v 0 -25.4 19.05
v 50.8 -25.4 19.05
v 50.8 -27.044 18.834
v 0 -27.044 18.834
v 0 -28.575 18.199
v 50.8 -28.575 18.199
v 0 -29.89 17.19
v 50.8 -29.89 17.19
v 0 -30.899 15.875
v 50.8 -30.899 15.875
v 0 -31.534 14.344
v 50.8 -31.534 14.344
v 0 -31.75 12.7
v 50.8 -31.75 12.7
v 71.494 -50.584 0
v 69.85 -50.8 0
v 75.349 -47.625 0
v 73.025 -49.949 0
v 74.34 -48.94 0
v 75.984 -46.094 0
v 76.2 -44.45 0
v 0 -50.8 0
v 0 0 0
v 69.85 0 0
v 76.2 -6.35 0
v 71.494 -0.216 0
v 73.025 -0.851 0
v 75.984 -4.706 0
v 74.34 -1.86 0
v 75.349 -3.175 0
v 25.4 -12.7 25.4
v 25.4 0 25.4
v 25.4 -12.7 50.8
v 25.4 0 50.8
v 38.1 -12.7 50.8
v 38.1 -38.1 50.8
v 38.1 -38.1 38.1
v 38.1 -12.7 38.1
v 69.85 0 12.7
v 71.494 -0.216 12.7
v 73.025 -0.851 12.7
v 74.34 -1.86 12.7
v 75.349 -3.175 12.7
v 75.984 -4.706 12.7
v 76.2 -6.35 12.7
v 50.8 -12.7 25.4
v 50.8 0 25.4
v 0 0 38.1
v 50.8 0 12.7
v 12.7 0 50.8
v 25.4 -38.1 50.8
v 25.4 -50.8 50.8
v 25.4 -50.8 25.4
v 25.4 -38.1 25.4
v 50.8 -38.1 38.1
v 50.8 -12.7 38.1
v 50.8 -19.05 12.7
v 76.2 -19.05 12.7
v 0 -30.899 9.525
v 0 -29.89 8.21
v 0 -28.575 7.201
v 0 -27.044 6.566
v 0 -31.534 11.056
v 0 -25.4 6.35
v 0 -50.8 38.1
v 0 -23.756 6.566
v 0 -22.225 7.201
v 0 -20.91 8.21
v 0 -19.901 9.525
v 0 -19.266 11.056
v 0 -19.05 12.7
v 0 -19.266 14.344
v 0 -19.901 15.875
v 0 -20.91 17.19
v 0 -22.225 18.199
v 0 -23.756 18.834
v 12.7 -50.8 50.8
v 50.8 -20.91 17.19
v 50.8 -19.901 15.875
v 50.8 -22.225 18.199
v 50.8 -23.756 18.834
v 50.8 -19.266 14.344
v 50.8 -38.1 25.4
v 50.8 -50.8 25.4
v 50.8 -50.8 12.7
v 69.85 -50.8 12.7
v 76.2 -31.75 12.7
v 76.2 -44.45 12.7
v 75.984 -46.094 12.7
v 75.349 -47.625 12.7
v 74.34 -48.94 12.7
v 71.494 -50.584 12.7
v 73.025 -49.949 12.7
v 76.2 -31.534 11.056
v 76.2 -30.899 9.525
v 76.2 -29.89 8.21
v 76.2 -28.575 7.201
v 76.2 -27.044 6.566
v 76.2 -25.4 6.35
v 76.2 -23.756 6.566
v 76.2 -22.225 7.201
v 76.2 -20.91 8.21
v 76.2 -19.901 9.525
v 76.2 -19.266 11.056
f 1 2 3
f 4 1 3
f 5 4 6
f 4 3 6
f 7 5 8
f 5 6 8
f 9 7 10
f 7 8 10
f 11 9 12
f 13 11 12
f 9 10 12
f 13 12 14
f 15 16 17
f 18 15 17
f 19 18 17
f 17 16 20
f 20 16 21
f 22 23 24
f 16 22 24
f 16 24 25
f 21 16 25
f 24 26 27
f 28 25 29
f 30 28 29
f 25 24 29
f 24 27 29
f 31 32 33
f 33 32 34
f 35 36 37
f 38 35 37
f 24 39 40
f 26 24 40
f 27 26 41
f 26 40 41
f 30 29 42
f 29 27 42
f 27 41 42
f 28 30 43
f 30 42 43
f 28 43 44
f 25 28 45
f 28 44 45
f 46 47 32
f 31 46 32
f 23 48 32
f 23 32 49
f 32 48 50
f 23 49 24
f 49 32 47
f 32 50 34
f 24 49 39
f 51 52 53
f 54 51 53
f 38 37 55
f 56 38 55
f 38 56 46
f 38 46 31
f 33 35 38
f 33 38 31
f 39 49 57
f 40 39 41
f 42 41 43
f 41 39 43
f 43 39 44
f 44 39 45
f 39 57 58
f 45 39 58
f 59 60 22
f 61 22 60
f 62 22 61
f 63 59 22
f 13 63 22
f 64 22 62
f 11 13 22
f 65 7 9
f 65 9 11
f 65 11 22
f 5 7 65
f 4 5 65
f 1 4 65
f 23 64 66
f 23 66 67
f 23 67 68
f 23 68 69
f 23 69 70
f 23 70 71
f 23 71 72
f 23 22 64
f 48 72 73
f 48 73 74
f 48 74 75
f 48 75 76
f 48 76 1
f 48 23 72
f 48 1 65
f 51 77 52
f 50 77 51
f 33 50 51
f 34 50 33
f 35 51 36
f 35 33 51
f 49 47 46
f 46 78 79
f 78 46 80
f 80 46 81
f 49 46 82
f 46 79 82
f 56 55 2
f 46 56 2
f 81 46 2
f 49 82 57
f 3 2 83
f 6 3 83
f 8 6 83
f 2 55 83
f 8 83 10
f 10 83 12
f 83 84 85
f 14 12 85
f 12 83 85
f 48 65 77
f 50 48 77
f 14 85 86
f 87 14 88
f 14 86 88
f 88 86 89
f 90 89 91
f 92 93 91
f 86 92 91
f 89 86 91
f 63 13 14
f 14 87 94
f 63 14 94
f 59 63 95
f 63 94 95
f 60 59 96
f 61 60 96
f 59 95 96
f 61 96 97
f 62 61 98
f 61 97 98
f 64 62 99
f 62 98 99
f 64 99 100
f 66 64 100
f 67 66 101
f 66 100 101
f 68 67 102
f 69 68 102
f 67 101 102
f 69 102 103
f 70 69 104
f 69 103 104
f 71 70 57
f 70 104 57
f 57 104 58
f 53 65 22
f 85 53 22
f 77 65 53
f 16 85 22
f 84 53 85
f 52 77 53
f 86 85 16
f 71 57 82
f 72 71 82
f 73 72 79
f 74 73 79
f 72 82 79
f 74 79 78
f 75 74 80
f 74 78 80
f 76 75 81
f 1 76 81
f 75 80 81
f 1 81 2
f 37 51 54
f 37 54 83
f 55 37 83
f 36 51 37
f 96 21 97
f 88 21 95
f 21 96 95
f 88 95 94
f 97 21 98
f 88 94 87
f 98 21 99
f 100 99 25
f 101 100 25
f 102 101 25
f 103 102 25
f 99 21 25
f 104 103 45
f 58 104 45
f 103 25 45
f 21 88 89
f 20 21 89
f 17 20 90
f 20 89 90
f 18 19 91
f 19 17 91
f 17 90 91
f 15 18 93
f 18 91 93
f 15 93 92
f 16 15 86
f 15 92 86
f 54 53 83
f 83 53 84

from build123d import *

# Parameters (mm, degrees)
F0_W      = 76.2
F0_H      = 50.8
F1_DEPTH  = 50.8
F3_DEPTH  = 50.801
F5_DEPTH  = 12.7
F6_W      = 25.4
F6_H      = 25.4
F7_DEPTH  = 12.7
F9_DEPTH  = 12.701
F11_DEPTH = 76.201


with BuildPart() as f1:
    # F0 (on Front) → F1 (new body)
    with BuildSketch(Plane.XZ):
        with Locations((38.1, 25.4)):
            Rectangle(F0_W, F0_H)
    extrude(amount=F1_DEPTH)

    # F2 (on face) → F3 (cut, through all)
    with BuildSketch(Plane.XZ.offset(50.8)):
        Polygon((12.7, 50.8), (0, 50.8), (0, 38.1), align=None)
        Polygon((76.2, 12.7), (76.2, 50.8), (38.1, 50.8), (38.1, 38.1), (50.8, 38.1), (50.8, 12.7), align=None)
    extrude(amount=-F3_DEPTH, mode=Mode.SUBTRACT)

    # F4 (on face) → F5 (cut)
    with BuildSketch(Plane.XZ.offset(50.8)):
        Polygon((25.4, 50.8), (25.4, 25.4), (50.8, 25.4), (50.8, 38.1), (38.1, 38.1), (38.1, 50.8), align=None)
    extrude(amount=-F5_DEPTH, mode=Mode.SUBTRACT)

    # F6 (on face) → F7 (cut)
    with BuildSketch(Plane(origin=(0, 0, 0), x_dir=(-1, 0, 0), z_dir=(0, 1, 0))):
        with Locations((-38.1, 38.1)):
            Rectangle(F6_W, F6_H)
    extrude(amount=-F7_DEPTH, mode=Mode.SUBTRACT)

    # F8 (on face) → F9 (cut, through all)
    with BuildSketch(Plane.XY.offset(12.7)):
        with BuildLine():
            ThreePointArc((76.2, -44.45), (74.340128, -48.940128), (69.85, -50.8))
            Line((69.85, -50.8), (76.2, -50.8))
            Line((76.2, -50.8), (76.2, -44.45))
        make_face()
        with BuildLine():
            Line((76.2, 0), (69.85, 0))
            ThreePointArc((69.85, 0), (74.340128, -1.859872), (76.2, -6.35))
            Line((76.2, -6.35), (76.2, 0))
        make_face()
    extrude(amount=-F9_DEPTH, mode=Mode.SUBTRACT)

    # F10 (on face) → F11 (cut, through all)
    with BuildSketch(Plane.YZ.offset(76.2)):
        with BuildLine():
            ThreePointArc((-25.4, 6.35), (-20.909872, 8.209872), (-19.05, 12.7))
            ThreePointArc((-19.05, 12.7), (-20.909872, 17.190128), (-25.4, 19.05))
            ThreePointArc((-25.4, 19.05), (-29.890128, 17.190128), (-31.75, 12.7))
            ThreePointArc((-31.75, 12.7), (-29.890128, 8.209872), (-25.4, 6.35))
        make_face()
    extrude(amount=-F11_DEPTH, mode=Mode.SUBTRACT)


solid = f1.part
